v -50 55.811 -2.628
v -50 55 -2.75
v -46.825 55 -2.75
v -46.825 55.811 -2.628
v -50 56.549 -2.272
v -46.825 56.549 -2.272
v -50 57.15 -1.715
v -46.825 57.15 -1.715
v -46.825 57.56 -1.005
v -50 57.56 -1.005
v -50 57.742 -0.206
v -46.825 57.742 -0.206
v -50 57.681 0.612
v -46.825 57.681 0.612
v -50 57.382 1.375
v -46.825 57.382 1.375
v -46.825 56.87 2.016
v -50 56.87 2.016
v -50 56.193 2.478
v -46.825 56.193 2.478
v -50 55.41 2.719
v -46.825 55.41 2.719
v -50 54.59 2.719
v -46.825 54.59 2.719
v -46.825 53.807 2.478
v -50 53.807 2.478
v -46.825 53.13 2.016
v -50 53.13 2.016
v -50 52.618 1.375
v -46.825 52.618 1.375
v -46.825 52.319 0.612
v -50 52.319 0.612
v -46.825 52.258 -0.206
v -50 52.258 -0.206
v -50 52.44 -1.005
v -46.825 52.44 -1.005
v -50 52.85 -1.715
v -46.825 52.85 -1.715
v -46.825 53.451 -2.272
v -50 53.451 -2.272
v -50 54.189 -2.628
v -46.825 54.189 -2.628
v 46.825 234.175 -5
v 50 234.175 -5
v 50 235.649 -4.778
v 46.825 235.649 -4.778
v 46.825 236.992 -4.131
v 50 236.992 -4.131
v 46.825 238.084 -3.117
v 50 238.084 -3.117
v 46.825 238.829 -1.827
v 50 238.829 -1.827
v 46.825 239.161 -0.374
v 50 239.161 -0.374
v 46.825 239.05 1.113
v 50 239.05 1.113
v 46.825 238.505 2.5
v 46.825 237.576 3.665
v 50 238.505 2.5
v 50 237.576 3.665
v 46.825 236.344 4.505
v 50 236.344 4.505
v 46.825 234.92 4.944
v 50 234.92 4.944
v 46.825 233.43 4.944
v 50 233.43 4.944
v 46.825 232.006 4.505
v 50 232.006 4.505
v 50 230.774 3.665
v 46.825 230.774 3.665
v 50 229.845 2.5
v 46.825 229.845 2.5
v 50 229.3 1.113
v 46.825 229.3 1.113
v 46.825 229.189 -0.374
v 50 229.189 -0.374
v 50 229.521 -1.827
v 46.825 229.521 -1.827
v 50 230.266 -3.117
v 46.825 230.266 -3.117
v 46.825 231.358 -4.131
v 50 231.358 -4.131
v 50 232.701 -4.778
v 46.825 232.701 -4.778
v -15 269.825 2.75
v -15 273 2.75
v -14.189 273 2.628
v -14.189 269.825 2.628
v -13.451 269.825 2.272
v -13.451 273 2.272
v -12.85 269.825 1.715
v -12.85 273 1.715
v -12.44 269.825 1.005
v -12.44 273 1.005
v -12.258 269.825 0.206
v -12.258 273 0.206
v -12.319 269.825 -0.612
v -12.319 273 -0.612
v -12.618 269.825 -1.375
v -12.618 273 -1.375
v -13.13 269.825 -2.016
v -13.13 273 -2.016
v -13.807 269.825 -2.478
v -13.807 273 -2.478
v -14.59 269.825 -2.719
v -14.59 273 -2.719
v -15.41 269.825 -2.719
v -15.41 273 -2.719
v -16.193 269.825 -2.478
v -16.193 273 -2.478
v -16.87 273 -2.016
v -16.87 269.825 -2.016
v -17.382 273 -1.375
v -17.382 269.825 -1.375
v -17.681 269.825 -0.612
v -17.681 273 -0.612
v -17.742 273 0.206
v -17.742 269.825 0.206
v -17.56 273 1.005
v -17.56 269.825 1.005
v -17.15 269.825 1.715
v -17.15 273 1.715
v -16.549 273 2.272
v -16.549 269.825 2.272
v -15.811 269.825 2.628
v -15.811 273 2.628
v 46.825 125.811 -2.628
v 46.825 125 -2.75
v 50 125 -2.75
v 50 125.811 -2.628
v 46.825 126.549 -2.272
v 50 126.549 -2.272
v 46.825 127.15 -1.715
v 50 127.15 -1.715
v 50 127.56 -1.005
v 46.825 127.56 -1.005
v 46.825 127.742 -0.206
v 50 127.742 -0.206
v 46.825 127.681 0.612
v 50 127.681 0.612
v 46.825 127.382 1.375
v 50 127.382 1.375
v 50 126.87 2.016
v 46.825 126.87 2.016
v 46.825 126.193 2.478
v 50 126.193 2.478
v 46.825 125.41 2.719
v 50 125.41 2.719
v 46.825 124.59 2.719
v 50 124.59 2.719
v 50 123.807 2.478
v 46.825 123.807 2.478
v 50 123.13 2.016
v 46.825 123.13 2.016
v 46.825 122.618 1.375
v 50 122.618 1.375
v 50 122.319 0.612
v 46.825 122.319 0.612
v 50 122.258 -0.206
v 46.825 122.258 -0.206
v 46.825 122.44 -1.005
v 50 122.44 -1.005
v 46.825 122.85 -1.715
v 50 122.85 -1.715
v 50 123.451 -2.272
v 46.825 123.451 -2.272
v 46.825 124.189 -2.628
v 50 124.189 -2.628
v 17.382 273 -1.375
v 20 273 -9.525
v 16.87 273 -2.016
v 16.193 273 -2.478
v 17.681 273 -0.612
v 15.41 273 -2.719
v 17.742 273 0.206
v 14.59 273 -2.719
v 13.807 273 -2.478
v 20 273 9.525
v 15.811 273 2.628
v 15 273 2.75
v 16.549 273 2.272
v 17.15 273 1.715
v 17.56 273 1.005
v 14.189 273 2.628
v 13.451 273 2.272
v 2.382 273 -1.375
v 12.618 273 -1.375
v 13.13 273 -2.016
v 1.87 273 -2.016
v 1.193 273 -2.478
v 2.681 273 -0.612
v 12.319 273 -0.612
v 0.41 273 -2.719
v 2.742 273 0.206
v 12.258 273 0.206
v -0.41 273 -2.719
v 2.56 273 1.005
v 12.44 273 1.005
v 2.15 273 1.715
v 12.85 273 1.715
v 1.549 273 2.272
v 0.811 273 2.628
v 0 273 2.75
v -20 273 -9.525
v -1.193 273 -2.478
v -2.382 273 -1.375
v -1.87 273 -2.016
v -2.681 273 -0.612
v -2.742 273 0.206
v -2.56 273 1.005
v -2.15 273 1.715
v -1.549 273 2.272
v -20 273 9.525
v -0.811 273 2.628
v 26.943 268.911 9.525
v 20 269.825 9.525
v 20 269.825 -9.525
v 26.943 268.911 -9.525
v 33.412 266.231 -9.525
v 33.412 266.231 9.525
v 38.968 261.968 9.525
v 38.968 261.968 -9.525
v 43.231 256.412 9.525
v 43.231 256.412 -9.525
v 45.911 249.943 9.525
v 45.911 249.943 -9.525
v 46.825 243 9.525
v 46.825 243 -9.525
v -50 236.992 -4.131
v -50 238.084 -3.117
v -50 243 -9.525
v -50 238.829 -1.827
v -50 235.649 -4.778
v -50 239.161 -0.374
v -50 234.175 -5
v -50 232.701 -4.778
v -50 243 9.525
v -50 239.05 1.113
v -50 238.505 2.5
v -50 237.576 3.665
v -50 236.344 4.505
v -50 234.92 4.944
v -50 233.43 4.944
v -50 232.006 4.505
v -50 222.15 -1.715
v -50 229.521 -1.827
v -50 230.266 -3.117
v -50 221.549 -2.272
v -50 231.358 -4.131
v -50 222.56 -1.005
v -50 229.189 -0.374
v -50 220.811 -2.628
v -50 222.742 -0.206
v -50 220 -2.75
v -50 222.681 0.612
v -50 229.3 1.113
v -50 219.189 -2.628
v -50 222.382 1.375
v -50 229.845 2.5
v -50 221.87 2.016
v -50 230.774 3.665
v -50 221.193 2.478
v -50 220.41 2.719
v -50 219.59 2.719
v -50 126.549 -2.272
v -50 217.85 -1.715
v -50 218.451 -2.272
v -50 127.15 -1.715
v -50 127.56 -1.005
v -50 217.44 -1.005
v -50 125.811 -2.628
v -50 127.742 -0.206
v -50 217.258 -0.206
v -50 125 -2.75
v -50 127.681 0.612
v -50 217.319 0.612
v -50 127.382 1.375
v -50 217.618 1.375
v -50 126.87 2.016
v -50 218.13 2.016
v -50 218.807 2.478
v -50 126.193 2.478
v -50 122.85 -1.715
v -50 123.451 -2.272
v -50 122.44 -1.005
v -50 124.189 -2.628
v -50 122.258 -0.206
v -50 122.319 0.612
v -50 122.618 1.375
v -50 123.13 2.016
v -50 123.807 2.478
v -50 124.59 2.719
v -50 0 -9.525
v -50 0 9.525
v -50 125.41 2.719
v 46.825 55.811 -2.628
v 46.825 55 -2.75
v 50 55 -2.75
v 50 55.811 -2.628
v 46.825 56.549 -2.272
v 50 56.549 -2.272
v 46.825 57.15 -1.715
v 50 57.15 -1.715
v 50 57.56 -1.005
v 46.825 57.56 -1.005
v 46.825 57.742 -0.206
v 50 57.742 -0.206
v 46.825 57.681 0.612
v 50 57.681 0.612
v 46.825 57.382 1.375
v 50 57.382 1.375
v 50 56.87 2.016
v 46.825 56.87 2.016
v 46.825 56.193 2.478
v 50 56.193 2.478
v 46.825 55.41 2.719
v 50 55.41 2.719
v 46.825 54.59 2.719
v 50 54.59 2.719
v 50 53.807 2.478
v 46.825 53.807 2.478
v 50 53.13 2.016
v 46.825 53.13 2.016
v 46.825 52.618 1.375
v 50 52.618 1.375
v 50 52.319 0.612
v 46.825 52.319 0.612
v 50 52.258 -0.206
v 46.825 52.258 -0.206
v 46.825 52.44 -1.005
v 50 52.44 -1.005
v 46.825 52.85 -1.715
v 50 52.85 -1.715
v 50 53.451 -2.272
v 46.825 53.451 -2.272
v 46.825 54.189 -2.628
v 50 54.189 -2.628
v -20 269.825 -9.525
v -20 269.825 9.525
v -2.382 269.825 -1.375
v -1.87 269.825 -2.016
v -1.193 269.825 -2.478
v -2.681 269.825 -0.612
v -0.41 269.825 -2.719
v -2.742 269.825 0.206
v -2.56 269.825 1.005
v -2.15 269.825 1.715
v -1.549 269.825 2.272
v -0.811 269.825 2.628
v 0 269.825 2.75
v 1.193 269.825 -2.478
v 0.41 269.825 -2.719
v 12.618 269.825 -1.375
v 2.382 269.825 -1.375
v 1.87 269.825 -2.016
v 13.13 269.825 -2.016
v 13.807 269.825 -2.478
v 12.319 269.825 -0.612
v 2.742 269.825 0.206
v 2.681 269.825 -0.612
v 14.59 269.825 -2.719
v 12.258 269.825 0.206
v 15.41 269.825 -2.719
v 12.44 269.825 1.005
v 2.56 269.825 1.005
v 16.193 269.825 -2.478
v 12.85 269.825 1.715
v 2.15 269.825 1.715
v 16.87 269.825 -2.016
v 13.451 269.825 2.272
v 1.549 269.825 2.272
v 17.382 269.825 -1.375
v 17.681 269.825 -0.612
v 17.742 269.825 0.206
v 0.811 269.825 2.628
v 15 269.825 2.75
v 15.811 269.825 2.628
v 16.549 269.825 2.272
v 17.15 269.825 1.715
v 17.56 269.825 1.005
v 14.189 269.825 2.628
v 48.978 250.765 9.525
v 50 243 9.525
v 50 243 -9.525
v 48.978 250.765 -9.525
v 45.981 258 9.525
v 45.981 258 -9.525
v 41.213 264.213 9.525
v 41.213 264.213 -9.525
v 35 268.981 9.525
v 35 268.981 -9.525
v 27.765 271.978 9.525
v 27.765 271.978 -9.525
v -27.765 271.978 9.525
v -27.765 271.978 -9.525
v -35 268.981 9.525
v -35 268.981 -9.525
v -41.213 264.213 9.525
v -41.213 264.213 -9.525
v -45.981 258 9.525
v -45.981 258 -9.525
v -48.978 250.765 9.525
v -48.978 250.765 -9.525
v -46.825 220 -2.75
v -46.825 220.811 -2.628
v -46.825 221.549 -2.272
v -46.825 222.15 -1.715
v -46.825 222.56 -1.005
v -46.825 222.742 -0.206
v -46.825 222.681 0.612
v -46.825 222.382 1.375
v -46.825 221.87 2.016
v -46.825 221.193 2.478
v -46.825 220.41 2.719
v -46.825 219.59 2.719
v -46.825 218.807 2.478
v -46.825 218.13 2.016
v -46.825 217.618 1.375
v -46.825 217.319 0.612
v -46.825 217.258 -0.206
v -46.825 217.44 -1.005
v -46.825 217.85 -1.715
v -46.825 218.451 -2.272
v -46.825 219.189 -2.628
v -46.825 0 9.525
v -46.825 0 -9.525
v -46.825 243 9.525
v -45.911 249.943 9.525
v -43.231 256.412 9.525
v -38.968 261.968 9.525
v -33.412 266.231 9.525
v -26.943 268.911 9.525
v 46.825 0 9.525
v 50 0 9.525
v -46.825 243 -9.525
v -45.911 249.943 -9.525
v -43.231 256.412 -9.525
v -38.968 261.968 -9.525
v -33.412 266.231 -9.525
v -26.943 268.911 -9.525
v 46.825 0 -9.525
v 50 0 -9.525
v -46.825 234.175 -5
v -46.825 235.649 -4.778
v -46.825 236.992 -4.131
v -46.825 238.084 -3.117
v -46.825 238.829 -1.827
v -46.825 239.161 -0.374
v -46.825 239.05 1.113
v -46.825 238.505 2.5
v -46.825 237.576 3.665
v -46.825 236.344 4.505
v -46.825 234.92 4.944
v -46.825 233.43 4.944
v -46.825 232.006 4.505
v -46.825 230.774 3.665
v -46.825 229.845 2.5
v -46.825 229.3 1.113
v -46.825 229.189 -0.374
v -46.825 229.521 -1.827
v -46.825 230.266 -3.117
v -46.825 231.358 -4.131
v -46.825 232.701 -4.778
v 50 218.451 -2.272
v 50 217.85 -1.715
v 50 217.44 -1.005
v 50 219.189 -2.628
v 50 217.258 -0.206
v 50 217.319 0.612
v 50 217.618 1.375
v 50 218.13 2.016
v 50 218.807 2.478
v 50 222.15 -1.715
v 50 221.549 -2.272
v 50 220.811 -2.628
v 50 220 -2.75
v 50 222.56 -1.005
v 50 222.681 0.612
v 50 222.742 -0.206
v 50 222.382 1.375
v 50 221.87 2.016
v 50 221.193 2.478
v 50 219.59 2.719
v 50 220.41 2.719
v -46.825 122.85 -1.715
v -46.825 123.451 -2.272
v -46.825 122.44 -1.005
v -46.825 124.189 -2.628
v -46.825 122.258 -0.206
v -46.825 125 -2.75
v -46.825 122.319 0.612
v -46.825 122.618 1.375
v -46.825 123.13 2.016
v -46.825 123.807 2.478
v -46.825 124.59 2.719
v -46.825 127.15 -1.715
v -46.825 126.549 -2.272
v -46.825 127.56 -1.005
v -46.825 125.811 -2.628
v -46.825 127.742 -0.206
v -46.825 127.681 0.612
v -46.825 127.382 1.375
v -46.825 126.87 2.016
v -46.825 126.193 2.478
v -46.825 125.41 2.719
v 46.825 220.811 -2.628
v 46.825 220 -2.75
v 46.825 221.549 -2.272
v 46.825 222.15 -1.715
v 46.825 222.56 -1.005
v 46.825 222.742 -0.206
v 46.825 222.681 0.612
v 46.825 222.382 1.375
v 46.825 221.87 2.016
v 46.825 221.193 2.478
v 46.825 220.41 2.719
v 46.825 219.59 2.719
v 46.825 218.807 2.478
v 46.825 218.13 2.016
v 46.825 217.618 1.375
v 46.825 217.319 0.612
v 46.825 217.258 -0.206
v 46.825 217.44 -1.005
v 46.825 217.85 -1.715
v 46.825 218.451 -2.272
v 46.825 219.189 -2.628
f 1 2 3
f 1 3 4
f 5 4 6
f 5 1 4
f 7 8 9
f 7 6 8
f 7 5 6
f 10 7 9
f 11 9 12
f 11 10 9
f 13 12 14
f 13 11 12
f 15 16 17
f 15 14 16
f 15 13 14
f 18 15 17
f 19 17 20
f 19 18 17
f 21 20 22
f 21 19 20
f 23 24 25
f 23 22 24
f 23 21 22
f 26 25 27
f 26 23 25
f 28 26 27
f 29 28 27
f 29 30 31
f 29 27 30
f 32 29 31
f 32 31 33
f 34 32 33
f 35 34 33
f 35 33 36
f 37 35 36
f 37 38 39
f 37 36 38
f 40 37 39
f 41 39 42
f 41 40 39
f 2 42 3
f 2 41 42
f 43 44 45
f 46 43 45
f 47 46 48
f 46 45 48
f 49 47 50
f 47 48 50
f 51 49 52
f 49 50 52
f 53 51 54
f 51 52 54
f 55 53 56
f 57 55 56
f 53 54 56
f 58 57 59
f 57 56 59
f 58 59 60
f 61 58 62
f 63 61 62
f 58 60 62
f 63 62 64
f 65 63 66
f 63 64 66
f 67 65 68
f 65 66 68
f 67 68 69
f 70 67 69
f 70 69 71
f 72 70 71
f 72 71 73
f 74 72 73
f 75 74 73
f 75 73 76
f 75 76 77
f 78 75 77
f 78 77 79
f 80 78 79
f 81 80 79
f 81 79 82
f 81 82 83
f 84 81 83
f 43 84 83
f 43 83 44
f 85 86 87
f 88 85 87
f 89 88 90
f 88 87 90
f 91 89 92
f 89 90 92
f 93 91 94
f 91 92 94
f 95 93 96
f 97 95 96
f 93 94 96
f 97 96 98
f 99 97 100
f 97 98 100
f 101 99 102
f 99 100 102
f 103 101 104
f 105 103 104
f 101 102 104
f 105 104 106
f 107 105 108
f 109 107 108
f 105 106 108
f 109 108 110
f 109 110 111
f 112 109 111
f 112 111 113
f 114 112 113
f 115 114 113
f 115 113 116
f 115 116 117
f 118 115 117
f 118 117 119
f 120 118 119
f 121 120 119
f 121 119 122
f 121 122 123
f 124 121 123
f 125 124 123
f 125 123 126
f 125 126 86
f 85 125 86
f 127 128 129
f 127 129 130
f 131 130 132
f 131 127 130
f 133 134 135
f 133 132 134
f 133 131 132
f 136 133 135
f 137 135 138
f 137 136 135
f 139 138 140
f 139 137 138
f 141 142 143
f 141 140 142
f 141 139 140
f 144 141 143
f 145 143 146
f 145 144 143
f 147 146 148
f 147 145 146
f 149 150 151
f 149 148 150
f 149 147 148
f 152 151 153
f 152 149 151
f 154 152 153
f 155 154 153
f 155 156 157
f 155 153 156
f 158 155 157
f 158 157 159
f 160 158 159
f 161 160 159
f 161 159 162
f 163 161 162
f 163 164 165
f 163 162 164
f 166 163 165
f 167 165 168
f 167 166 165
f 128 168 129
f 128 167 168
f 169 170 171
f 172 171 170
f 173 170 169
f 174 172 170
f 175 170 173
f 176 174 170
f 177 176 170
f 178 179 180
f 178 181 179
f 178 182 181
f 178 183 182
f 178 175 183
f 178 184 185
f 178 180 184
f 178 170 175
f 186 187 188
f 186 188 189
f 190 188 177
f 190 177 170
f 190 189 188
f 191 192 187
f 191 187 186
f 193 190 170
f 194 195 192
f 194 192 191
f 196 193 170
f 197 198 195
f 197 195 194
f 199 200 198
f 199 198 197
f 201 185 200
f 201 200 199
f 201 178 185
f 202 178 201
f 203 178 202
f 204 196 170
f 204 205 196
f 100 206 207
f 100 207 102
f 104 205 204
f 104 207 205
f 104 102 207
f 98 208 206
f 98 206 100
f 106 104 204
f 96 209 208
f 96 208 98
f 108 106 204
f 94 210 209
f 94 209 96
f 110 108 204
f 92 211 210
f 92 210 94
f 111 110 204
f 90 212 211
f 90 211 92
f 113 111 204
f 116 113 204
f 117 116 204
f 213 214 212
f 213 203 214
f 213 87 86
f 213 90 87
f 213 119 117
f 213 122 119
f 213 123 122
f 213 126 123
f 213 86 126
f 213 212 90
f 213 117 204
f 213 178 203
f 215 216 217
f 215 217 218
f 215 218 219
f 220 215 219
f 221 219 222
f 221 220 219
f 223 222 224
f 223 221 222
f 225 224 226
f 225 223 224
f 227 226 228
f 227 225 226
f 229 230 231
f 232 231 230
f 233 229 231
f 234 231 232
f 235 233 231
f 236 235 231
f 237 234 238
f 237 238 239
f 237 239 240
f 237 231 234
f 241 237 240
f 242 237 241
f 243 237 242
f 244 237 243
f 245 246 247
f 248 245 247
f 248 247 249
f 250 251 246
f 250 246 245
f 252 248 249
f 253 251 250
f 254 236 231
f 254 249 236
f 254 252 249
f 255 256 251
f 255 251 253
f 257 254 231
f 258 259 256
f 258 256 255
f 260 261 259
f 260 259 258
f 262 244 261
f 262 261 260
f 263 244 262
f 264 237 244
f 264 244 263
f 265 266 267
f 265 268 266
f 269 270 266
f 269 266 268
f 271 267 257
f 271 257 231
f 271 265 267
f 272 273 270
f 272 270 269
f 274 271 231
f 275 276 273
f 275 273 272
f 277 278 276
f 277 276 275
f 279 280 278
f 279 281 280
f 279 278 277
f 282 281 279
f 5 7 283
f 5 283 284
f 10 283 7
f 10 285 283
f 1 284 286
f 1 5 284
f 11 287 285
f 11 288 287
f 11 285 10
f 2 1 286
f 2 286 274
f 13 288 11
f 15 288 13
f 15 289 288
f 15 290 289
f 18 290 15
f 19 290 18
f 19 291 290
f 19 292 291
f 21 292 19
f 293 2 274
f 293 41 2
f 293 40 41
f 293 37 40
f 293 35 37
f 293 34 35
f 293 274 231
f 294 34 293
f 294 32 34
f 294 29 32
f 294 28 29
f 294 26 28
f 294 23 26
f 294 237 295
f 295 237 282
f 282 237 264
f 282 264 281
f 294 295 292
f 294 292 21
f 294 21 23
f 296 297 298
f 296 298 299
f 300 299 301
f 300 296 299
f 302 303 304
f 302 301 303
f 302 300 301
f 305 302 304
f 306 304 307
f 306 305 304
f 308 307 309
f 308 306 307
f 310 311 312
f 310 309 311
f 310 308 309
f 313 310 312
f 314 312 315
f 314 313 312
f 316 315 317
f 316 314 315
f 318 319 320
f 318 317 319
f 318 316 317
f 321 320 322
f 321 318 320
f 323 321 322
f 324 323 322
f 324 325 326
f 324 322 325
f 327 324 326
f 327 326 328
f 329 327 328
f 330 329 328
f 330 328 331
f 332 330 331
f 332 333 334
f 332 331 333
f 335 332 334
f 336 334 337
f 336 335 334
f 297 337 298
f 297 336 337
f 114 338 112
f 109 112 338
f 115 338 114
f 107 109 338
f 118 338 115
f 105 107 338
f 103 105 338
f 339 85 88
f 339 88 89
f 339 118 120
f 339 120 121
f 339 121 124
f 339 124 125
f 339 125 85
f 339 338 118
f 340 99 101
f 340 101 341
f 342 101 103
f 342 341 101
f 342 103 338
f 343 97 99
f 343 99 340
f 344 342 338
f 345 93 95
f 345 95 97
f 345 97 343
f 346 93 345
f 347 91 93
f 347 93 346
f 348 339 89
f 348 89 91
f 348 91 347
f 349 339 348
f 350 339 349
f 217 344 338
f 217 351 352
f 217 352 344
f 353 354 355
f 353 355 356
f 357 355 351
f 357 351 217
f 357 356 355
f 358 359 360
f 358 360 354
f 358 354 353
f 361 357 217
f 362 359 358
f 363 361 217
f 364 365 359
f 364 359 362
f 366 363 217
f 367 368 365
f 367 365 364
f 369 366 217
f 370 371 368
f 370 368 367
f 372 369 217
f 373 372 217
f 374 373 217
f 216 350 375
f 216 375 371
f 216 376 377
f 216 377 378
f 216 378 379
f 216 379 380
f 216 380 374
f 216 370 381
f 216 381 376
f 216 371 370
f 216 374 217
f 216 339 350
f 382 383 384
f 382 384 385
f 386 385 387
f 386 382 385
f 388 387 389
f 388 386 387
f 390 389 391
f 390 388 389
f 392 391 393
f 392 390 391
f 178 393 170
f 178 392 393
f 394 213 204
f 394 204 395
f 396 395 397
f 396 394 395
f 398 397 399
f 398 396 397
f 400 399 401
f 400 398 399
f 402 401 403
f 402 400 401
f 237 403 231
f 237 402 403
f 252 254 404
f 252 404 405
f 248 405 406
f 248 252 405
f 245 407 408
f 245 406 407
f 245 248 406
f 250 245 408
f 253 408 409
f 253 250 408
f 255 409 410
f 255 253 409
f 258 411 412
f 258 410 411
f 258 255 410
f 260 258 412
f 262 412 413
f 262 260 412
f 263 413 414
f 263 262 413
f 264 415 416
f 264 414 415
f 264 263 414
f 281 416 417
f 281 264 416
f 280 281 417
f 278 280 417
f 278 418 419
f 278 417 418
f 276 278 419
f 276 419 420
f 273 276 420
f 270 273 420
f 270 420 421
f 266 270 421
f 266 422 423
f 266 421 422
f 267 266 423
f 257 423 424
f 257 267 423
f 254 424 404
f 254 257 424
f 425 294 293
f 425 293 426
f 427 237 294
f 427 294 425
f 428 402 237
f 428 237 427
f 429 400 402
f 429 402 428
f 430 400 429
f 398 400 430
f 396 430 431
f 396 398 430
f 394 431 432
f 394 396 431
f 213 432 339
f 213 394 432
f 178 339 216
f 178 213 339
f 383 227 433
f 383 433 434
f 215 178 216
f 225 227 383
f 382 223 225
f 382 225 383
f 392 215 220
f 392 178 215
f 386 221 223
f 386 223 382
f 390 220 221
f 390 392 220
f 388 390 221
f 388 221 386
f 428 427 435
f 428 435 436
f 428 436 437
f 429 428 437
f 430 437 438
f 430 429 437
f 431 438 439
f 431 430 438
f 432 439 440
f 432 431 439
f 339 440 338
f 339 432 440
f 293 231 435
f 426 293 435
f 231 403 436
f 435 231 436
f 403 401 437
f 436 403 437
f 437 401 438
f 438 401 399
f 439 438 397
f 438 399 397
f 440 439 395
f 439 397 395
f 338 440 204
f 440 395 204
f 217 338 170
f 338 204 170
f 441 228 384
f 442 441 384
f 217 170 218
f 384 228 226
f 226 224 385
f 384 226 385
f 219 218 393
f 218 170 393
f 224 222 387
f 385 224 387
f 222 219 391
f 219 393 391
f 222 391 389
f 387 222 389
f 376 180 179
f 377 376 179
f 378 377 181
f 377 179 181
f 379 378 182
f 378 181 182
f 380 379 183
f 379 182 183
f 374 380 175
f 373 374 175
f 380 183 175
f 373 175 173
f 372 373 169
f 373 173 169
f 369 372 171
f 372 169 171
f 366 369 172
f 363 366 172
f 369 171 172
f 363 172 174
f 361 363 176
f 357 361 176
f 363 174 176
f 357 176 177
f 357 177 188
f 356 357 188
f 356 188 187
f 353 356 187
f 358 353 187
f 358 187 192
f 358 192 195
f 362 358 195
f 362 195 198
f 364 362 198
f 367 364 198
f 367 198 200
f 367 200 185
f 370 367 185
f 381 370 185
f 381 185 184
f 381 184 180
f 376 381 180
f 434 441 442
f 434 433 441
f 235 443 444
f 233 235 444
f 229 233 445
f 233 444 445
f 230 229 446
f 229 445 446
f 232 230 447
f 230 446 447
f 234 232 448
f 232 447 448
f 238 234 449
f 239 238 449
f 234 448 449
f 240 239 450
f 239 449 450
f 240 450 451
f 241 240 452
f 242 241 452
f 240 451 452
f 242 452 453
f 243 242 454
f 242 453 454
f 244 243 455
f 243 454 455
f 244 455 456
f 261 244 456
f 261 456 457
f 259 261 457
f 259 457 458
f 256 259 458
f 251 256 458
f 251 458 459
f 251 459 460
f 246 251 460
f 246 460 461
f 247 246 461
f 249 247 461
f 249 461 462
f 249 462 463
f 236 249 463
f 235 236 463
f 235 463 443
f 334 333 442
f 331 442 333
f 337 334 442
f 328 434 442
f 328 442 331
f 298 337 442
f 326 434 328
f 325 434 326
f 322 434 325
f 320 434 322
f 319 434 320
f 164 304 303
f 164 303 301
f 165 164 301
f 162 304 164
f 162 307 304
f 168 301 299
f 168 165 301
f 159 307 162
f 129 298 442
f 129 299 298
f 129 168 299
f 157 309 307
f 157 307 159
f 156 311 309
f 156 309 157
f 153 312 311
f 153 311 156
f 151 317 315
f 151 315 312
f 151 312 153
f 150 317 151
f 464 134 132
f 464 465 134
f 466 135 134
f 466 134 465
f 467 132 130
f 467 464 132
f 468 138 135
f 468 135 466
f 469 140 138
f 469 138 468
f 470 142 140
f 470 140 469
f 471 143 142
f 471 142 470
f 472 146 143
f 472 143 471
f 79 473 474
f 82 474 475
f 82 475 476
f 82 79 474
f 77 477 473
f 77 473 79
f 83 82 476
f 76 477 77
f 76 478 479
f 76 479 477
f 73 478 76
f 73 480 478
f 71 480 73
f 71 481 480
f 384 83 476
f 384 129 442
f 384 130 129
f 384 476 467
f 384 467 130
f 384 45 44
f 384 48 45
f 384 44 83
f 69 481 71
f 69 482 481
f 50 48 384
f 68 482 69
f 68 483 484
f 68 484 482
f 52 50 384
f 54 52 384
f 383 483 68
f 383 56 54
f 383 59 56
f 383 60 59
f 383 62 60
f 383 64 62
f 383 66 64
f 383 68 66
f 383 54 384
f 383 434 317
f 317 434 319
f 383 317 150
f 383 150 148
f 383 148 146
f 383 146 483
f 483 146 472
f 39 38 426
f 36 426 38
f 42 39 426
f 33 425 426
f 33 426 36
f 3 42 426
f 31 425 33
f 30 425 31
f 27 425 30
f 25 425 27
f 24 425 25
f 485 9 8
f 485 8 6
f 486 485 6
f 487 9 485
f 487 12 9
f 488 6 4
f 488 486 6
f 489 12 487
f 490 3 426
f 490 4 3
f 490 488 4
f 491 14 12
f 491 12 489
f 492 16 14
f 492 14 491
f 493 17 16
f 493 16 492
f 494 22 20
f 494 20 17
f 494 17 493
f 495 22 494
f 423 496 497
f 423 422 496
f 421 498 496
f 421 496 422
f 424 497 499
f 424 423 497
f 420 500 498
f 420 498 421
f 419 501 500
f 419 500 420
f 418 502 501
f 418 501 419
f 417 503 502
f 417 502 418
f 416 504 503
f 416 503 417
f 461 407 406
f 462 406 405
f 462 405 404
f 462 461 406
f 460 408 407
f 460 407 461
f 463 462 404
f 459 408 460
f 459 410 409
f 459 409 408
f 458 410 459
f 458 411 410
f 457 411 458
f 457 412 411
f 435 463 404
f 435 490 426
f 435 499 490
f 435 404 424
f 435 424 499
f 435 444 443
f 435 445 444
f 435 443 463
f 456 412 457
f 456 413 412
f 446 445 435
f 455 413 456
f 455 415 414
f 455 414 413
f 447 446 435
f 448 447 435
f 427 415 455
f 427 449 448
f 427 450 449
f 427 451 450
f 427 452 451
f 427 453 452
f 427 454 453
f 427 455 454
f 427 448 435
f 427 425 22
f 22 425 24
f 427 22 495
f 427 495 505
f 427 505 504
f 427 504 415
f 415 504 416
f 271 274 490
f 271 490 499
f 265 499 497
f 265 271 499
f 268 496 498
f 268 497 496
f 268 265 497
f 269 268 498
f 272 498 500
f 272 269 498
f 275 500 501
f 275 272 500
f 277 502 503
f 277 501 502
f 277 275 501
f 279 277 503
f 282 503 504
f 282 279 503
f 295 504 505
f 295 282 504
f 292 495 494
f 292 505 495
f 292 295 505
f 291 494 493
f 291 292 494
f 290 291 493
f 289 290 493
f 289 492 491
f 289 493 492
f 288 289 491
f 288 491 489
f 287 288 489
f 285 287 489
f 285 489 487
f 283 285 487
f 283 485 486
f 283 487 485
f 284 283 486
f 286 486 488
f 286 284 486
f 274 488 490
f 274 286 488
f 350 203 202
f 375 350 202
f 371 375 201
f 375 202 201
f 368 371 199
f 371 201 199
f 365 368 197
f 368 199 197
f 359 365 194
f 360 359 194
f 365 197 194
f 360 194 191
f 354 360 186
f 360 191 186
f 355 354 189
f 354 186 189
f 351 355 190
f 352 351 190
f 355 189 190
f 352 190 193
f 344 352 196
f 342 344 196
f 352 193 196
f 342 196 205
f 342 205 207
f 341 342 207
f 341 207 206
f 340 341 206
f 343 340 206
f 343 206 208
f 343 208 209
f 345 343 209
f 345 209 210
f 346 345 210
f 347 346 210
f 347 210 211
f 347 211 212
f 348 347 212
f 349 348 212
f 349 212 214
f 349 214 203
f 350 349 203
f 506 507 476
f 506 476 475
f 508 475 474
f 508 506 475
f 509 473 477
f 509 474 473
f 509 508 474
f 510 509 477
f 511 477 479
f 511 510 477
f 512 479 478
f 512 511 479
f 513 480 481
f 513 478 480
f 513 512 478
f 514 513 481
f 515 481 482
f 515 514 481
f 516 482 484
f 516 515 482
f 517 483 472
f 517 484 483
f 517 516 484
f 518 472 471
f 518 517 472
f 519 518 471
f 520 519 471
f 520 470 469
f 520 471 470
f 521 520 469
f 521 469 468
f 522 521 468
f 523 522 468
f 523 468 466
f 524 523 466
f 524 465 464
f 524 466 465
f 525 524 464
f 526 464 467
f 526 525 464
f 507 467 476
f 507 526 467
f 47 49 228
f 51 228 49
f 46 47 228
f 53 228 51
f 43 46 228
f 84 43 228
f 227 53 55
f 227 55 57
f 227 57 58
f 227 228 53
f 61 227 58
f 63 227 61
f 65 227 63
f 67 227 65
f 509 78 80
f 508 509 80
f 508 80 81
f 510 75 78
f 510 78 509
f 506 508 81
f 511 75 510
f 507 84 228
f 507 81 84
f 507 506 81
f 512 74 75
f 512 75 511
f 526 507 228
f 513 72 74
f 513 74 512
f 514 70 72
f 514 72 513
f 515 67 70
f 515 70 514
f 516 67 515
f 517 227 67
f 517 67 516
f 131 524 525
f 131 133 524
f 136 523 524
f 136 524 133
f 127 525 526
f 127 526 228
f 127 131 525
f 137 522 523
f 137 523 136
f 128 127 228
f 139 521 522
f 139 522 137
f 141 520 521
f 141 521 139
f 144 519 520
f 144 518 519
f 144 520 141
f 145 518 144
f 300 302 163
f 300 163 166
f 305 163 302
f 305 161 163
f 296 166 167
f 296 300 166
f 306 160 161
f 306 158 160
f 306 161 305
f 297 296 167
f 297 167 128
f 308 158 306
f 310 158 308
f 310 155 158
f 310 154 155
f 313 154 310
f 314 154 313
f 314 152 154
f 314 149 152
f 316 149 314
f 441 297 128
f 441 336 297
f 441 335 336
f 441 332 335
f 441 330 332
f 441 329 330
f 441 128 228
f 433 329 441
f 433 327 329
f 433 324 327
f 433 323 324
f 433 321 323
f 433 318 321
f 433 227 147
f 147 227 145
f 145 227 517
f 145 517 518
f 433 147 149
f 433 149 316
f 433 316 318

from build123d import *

# Parameters (mm, degrees)
BOSS_EXTRUDE1_DEPTH     = 9.525
SKETCH12_R              = 2.75
CUT_EXTRUDE2_DEPTH      = 278.704385318
CUT_EXTRUDE3_DEPTH      = 291.894698516
CUT_EXTRUDE3_DEPTH_BACK = 291.894698516
SKETCH13_R              = 2.75
SKETCH14_R              = 5
CUT_EXTRUDE4_DEPTH      = 291.894698516


with BuildPart() as part:
    # Sketch1 → Boss-Extrude1 (new, symmetric)
    with BuildSketch(Plane.XY):
        with BuildLine():
            Line((50, 0), (50, 243))
            ThreePointArc((50, 243), (41.213203436, 264.213203436), (20, 273))
            Line((20, 273), (-20, 273))
            ThreePointArc((-20, 273), (-41.213203436, 264.213203436), (-50, 243))
            Line((-50, 243), (-50, 0))
            Line((-50, 0), (-46.825, 0))
            Line((-46.825, 0), (-46.825, 243))
            ThreePointArc((-46.825, 243), (-38.968139405, 261.968139405), (-20, 269.825))
            Line((-20, 269.825), (20, 269.825))
            ThreePointArc((20, 269.825), (38.968139405, 261.968139405), (46.825, 243))
            Line((46.825, 243), (46.825, 0))
            Line((46.825, 0), (50, 0))
        make_face()
    extrude(amount=BOSS_EXTRUDE1_DEPTH, both=True)

    # Sketch12 → Cut-Extrude2 (cut, through all)
    with BuildSketch(Plane(origin=(0, 273, 0), x_dir=(1, 0, 0), z_dir=(0, 1, 0))):
        with Locations(Location((0, 0, 0), (0, 0, 270))):
            Circle(SKETCH12_R)
        with Locations(Location((-15, 0, 0), (0, 0, 270))):
            Circle(SKETCH12_R)
        with Locations(Location((15, 0, 0), (0, 0, 270))):
            Circle(SKETCH12_R)
    extrude(amount=-CUT_EXTRUDE2_DEPTH, mode=Mode.SUBTRACT)

    # Sketch13 → Cut-Extrude3 (cut, two sides: drawn at the far end of the back side and taken through both)
    with BuildSketch(Plane(origin=(50, 0, 0), x_dir=(0, 0, -1), z_dir=(1, 0, 0)).offset(-CUT_EXTRUDE3_DEPTH_BACK)):
        with Locations((0, 220)):
            Circle(SKETCH13_R)
        with Locations((0, 125)):
            Circle(SKETCH13_R)
        with Locations((0, 55)):
            Circle(SKETCH13_R)
    extrude(amount=CUT_EXTRUDE3_DEPTH + CUT_EXTRUDE3_DEPTH_BACK, mode=Mode.SUBTRACT)

    # Sketch14 → Cut-Extrude4 (cut, through all)
    with BuildSketch(Plane(origin=(50, 0, 0), x_dir=(0, 0, -1), z_dir=(1, 0, 0))):
        with Locations((0, 234.175)):
            Circle(SKETCH14_R)
    extrude(amount=-CUT_EXTRUDE4_DEPTH, mode=Mode.SUBTRACT)


solid = part.part
